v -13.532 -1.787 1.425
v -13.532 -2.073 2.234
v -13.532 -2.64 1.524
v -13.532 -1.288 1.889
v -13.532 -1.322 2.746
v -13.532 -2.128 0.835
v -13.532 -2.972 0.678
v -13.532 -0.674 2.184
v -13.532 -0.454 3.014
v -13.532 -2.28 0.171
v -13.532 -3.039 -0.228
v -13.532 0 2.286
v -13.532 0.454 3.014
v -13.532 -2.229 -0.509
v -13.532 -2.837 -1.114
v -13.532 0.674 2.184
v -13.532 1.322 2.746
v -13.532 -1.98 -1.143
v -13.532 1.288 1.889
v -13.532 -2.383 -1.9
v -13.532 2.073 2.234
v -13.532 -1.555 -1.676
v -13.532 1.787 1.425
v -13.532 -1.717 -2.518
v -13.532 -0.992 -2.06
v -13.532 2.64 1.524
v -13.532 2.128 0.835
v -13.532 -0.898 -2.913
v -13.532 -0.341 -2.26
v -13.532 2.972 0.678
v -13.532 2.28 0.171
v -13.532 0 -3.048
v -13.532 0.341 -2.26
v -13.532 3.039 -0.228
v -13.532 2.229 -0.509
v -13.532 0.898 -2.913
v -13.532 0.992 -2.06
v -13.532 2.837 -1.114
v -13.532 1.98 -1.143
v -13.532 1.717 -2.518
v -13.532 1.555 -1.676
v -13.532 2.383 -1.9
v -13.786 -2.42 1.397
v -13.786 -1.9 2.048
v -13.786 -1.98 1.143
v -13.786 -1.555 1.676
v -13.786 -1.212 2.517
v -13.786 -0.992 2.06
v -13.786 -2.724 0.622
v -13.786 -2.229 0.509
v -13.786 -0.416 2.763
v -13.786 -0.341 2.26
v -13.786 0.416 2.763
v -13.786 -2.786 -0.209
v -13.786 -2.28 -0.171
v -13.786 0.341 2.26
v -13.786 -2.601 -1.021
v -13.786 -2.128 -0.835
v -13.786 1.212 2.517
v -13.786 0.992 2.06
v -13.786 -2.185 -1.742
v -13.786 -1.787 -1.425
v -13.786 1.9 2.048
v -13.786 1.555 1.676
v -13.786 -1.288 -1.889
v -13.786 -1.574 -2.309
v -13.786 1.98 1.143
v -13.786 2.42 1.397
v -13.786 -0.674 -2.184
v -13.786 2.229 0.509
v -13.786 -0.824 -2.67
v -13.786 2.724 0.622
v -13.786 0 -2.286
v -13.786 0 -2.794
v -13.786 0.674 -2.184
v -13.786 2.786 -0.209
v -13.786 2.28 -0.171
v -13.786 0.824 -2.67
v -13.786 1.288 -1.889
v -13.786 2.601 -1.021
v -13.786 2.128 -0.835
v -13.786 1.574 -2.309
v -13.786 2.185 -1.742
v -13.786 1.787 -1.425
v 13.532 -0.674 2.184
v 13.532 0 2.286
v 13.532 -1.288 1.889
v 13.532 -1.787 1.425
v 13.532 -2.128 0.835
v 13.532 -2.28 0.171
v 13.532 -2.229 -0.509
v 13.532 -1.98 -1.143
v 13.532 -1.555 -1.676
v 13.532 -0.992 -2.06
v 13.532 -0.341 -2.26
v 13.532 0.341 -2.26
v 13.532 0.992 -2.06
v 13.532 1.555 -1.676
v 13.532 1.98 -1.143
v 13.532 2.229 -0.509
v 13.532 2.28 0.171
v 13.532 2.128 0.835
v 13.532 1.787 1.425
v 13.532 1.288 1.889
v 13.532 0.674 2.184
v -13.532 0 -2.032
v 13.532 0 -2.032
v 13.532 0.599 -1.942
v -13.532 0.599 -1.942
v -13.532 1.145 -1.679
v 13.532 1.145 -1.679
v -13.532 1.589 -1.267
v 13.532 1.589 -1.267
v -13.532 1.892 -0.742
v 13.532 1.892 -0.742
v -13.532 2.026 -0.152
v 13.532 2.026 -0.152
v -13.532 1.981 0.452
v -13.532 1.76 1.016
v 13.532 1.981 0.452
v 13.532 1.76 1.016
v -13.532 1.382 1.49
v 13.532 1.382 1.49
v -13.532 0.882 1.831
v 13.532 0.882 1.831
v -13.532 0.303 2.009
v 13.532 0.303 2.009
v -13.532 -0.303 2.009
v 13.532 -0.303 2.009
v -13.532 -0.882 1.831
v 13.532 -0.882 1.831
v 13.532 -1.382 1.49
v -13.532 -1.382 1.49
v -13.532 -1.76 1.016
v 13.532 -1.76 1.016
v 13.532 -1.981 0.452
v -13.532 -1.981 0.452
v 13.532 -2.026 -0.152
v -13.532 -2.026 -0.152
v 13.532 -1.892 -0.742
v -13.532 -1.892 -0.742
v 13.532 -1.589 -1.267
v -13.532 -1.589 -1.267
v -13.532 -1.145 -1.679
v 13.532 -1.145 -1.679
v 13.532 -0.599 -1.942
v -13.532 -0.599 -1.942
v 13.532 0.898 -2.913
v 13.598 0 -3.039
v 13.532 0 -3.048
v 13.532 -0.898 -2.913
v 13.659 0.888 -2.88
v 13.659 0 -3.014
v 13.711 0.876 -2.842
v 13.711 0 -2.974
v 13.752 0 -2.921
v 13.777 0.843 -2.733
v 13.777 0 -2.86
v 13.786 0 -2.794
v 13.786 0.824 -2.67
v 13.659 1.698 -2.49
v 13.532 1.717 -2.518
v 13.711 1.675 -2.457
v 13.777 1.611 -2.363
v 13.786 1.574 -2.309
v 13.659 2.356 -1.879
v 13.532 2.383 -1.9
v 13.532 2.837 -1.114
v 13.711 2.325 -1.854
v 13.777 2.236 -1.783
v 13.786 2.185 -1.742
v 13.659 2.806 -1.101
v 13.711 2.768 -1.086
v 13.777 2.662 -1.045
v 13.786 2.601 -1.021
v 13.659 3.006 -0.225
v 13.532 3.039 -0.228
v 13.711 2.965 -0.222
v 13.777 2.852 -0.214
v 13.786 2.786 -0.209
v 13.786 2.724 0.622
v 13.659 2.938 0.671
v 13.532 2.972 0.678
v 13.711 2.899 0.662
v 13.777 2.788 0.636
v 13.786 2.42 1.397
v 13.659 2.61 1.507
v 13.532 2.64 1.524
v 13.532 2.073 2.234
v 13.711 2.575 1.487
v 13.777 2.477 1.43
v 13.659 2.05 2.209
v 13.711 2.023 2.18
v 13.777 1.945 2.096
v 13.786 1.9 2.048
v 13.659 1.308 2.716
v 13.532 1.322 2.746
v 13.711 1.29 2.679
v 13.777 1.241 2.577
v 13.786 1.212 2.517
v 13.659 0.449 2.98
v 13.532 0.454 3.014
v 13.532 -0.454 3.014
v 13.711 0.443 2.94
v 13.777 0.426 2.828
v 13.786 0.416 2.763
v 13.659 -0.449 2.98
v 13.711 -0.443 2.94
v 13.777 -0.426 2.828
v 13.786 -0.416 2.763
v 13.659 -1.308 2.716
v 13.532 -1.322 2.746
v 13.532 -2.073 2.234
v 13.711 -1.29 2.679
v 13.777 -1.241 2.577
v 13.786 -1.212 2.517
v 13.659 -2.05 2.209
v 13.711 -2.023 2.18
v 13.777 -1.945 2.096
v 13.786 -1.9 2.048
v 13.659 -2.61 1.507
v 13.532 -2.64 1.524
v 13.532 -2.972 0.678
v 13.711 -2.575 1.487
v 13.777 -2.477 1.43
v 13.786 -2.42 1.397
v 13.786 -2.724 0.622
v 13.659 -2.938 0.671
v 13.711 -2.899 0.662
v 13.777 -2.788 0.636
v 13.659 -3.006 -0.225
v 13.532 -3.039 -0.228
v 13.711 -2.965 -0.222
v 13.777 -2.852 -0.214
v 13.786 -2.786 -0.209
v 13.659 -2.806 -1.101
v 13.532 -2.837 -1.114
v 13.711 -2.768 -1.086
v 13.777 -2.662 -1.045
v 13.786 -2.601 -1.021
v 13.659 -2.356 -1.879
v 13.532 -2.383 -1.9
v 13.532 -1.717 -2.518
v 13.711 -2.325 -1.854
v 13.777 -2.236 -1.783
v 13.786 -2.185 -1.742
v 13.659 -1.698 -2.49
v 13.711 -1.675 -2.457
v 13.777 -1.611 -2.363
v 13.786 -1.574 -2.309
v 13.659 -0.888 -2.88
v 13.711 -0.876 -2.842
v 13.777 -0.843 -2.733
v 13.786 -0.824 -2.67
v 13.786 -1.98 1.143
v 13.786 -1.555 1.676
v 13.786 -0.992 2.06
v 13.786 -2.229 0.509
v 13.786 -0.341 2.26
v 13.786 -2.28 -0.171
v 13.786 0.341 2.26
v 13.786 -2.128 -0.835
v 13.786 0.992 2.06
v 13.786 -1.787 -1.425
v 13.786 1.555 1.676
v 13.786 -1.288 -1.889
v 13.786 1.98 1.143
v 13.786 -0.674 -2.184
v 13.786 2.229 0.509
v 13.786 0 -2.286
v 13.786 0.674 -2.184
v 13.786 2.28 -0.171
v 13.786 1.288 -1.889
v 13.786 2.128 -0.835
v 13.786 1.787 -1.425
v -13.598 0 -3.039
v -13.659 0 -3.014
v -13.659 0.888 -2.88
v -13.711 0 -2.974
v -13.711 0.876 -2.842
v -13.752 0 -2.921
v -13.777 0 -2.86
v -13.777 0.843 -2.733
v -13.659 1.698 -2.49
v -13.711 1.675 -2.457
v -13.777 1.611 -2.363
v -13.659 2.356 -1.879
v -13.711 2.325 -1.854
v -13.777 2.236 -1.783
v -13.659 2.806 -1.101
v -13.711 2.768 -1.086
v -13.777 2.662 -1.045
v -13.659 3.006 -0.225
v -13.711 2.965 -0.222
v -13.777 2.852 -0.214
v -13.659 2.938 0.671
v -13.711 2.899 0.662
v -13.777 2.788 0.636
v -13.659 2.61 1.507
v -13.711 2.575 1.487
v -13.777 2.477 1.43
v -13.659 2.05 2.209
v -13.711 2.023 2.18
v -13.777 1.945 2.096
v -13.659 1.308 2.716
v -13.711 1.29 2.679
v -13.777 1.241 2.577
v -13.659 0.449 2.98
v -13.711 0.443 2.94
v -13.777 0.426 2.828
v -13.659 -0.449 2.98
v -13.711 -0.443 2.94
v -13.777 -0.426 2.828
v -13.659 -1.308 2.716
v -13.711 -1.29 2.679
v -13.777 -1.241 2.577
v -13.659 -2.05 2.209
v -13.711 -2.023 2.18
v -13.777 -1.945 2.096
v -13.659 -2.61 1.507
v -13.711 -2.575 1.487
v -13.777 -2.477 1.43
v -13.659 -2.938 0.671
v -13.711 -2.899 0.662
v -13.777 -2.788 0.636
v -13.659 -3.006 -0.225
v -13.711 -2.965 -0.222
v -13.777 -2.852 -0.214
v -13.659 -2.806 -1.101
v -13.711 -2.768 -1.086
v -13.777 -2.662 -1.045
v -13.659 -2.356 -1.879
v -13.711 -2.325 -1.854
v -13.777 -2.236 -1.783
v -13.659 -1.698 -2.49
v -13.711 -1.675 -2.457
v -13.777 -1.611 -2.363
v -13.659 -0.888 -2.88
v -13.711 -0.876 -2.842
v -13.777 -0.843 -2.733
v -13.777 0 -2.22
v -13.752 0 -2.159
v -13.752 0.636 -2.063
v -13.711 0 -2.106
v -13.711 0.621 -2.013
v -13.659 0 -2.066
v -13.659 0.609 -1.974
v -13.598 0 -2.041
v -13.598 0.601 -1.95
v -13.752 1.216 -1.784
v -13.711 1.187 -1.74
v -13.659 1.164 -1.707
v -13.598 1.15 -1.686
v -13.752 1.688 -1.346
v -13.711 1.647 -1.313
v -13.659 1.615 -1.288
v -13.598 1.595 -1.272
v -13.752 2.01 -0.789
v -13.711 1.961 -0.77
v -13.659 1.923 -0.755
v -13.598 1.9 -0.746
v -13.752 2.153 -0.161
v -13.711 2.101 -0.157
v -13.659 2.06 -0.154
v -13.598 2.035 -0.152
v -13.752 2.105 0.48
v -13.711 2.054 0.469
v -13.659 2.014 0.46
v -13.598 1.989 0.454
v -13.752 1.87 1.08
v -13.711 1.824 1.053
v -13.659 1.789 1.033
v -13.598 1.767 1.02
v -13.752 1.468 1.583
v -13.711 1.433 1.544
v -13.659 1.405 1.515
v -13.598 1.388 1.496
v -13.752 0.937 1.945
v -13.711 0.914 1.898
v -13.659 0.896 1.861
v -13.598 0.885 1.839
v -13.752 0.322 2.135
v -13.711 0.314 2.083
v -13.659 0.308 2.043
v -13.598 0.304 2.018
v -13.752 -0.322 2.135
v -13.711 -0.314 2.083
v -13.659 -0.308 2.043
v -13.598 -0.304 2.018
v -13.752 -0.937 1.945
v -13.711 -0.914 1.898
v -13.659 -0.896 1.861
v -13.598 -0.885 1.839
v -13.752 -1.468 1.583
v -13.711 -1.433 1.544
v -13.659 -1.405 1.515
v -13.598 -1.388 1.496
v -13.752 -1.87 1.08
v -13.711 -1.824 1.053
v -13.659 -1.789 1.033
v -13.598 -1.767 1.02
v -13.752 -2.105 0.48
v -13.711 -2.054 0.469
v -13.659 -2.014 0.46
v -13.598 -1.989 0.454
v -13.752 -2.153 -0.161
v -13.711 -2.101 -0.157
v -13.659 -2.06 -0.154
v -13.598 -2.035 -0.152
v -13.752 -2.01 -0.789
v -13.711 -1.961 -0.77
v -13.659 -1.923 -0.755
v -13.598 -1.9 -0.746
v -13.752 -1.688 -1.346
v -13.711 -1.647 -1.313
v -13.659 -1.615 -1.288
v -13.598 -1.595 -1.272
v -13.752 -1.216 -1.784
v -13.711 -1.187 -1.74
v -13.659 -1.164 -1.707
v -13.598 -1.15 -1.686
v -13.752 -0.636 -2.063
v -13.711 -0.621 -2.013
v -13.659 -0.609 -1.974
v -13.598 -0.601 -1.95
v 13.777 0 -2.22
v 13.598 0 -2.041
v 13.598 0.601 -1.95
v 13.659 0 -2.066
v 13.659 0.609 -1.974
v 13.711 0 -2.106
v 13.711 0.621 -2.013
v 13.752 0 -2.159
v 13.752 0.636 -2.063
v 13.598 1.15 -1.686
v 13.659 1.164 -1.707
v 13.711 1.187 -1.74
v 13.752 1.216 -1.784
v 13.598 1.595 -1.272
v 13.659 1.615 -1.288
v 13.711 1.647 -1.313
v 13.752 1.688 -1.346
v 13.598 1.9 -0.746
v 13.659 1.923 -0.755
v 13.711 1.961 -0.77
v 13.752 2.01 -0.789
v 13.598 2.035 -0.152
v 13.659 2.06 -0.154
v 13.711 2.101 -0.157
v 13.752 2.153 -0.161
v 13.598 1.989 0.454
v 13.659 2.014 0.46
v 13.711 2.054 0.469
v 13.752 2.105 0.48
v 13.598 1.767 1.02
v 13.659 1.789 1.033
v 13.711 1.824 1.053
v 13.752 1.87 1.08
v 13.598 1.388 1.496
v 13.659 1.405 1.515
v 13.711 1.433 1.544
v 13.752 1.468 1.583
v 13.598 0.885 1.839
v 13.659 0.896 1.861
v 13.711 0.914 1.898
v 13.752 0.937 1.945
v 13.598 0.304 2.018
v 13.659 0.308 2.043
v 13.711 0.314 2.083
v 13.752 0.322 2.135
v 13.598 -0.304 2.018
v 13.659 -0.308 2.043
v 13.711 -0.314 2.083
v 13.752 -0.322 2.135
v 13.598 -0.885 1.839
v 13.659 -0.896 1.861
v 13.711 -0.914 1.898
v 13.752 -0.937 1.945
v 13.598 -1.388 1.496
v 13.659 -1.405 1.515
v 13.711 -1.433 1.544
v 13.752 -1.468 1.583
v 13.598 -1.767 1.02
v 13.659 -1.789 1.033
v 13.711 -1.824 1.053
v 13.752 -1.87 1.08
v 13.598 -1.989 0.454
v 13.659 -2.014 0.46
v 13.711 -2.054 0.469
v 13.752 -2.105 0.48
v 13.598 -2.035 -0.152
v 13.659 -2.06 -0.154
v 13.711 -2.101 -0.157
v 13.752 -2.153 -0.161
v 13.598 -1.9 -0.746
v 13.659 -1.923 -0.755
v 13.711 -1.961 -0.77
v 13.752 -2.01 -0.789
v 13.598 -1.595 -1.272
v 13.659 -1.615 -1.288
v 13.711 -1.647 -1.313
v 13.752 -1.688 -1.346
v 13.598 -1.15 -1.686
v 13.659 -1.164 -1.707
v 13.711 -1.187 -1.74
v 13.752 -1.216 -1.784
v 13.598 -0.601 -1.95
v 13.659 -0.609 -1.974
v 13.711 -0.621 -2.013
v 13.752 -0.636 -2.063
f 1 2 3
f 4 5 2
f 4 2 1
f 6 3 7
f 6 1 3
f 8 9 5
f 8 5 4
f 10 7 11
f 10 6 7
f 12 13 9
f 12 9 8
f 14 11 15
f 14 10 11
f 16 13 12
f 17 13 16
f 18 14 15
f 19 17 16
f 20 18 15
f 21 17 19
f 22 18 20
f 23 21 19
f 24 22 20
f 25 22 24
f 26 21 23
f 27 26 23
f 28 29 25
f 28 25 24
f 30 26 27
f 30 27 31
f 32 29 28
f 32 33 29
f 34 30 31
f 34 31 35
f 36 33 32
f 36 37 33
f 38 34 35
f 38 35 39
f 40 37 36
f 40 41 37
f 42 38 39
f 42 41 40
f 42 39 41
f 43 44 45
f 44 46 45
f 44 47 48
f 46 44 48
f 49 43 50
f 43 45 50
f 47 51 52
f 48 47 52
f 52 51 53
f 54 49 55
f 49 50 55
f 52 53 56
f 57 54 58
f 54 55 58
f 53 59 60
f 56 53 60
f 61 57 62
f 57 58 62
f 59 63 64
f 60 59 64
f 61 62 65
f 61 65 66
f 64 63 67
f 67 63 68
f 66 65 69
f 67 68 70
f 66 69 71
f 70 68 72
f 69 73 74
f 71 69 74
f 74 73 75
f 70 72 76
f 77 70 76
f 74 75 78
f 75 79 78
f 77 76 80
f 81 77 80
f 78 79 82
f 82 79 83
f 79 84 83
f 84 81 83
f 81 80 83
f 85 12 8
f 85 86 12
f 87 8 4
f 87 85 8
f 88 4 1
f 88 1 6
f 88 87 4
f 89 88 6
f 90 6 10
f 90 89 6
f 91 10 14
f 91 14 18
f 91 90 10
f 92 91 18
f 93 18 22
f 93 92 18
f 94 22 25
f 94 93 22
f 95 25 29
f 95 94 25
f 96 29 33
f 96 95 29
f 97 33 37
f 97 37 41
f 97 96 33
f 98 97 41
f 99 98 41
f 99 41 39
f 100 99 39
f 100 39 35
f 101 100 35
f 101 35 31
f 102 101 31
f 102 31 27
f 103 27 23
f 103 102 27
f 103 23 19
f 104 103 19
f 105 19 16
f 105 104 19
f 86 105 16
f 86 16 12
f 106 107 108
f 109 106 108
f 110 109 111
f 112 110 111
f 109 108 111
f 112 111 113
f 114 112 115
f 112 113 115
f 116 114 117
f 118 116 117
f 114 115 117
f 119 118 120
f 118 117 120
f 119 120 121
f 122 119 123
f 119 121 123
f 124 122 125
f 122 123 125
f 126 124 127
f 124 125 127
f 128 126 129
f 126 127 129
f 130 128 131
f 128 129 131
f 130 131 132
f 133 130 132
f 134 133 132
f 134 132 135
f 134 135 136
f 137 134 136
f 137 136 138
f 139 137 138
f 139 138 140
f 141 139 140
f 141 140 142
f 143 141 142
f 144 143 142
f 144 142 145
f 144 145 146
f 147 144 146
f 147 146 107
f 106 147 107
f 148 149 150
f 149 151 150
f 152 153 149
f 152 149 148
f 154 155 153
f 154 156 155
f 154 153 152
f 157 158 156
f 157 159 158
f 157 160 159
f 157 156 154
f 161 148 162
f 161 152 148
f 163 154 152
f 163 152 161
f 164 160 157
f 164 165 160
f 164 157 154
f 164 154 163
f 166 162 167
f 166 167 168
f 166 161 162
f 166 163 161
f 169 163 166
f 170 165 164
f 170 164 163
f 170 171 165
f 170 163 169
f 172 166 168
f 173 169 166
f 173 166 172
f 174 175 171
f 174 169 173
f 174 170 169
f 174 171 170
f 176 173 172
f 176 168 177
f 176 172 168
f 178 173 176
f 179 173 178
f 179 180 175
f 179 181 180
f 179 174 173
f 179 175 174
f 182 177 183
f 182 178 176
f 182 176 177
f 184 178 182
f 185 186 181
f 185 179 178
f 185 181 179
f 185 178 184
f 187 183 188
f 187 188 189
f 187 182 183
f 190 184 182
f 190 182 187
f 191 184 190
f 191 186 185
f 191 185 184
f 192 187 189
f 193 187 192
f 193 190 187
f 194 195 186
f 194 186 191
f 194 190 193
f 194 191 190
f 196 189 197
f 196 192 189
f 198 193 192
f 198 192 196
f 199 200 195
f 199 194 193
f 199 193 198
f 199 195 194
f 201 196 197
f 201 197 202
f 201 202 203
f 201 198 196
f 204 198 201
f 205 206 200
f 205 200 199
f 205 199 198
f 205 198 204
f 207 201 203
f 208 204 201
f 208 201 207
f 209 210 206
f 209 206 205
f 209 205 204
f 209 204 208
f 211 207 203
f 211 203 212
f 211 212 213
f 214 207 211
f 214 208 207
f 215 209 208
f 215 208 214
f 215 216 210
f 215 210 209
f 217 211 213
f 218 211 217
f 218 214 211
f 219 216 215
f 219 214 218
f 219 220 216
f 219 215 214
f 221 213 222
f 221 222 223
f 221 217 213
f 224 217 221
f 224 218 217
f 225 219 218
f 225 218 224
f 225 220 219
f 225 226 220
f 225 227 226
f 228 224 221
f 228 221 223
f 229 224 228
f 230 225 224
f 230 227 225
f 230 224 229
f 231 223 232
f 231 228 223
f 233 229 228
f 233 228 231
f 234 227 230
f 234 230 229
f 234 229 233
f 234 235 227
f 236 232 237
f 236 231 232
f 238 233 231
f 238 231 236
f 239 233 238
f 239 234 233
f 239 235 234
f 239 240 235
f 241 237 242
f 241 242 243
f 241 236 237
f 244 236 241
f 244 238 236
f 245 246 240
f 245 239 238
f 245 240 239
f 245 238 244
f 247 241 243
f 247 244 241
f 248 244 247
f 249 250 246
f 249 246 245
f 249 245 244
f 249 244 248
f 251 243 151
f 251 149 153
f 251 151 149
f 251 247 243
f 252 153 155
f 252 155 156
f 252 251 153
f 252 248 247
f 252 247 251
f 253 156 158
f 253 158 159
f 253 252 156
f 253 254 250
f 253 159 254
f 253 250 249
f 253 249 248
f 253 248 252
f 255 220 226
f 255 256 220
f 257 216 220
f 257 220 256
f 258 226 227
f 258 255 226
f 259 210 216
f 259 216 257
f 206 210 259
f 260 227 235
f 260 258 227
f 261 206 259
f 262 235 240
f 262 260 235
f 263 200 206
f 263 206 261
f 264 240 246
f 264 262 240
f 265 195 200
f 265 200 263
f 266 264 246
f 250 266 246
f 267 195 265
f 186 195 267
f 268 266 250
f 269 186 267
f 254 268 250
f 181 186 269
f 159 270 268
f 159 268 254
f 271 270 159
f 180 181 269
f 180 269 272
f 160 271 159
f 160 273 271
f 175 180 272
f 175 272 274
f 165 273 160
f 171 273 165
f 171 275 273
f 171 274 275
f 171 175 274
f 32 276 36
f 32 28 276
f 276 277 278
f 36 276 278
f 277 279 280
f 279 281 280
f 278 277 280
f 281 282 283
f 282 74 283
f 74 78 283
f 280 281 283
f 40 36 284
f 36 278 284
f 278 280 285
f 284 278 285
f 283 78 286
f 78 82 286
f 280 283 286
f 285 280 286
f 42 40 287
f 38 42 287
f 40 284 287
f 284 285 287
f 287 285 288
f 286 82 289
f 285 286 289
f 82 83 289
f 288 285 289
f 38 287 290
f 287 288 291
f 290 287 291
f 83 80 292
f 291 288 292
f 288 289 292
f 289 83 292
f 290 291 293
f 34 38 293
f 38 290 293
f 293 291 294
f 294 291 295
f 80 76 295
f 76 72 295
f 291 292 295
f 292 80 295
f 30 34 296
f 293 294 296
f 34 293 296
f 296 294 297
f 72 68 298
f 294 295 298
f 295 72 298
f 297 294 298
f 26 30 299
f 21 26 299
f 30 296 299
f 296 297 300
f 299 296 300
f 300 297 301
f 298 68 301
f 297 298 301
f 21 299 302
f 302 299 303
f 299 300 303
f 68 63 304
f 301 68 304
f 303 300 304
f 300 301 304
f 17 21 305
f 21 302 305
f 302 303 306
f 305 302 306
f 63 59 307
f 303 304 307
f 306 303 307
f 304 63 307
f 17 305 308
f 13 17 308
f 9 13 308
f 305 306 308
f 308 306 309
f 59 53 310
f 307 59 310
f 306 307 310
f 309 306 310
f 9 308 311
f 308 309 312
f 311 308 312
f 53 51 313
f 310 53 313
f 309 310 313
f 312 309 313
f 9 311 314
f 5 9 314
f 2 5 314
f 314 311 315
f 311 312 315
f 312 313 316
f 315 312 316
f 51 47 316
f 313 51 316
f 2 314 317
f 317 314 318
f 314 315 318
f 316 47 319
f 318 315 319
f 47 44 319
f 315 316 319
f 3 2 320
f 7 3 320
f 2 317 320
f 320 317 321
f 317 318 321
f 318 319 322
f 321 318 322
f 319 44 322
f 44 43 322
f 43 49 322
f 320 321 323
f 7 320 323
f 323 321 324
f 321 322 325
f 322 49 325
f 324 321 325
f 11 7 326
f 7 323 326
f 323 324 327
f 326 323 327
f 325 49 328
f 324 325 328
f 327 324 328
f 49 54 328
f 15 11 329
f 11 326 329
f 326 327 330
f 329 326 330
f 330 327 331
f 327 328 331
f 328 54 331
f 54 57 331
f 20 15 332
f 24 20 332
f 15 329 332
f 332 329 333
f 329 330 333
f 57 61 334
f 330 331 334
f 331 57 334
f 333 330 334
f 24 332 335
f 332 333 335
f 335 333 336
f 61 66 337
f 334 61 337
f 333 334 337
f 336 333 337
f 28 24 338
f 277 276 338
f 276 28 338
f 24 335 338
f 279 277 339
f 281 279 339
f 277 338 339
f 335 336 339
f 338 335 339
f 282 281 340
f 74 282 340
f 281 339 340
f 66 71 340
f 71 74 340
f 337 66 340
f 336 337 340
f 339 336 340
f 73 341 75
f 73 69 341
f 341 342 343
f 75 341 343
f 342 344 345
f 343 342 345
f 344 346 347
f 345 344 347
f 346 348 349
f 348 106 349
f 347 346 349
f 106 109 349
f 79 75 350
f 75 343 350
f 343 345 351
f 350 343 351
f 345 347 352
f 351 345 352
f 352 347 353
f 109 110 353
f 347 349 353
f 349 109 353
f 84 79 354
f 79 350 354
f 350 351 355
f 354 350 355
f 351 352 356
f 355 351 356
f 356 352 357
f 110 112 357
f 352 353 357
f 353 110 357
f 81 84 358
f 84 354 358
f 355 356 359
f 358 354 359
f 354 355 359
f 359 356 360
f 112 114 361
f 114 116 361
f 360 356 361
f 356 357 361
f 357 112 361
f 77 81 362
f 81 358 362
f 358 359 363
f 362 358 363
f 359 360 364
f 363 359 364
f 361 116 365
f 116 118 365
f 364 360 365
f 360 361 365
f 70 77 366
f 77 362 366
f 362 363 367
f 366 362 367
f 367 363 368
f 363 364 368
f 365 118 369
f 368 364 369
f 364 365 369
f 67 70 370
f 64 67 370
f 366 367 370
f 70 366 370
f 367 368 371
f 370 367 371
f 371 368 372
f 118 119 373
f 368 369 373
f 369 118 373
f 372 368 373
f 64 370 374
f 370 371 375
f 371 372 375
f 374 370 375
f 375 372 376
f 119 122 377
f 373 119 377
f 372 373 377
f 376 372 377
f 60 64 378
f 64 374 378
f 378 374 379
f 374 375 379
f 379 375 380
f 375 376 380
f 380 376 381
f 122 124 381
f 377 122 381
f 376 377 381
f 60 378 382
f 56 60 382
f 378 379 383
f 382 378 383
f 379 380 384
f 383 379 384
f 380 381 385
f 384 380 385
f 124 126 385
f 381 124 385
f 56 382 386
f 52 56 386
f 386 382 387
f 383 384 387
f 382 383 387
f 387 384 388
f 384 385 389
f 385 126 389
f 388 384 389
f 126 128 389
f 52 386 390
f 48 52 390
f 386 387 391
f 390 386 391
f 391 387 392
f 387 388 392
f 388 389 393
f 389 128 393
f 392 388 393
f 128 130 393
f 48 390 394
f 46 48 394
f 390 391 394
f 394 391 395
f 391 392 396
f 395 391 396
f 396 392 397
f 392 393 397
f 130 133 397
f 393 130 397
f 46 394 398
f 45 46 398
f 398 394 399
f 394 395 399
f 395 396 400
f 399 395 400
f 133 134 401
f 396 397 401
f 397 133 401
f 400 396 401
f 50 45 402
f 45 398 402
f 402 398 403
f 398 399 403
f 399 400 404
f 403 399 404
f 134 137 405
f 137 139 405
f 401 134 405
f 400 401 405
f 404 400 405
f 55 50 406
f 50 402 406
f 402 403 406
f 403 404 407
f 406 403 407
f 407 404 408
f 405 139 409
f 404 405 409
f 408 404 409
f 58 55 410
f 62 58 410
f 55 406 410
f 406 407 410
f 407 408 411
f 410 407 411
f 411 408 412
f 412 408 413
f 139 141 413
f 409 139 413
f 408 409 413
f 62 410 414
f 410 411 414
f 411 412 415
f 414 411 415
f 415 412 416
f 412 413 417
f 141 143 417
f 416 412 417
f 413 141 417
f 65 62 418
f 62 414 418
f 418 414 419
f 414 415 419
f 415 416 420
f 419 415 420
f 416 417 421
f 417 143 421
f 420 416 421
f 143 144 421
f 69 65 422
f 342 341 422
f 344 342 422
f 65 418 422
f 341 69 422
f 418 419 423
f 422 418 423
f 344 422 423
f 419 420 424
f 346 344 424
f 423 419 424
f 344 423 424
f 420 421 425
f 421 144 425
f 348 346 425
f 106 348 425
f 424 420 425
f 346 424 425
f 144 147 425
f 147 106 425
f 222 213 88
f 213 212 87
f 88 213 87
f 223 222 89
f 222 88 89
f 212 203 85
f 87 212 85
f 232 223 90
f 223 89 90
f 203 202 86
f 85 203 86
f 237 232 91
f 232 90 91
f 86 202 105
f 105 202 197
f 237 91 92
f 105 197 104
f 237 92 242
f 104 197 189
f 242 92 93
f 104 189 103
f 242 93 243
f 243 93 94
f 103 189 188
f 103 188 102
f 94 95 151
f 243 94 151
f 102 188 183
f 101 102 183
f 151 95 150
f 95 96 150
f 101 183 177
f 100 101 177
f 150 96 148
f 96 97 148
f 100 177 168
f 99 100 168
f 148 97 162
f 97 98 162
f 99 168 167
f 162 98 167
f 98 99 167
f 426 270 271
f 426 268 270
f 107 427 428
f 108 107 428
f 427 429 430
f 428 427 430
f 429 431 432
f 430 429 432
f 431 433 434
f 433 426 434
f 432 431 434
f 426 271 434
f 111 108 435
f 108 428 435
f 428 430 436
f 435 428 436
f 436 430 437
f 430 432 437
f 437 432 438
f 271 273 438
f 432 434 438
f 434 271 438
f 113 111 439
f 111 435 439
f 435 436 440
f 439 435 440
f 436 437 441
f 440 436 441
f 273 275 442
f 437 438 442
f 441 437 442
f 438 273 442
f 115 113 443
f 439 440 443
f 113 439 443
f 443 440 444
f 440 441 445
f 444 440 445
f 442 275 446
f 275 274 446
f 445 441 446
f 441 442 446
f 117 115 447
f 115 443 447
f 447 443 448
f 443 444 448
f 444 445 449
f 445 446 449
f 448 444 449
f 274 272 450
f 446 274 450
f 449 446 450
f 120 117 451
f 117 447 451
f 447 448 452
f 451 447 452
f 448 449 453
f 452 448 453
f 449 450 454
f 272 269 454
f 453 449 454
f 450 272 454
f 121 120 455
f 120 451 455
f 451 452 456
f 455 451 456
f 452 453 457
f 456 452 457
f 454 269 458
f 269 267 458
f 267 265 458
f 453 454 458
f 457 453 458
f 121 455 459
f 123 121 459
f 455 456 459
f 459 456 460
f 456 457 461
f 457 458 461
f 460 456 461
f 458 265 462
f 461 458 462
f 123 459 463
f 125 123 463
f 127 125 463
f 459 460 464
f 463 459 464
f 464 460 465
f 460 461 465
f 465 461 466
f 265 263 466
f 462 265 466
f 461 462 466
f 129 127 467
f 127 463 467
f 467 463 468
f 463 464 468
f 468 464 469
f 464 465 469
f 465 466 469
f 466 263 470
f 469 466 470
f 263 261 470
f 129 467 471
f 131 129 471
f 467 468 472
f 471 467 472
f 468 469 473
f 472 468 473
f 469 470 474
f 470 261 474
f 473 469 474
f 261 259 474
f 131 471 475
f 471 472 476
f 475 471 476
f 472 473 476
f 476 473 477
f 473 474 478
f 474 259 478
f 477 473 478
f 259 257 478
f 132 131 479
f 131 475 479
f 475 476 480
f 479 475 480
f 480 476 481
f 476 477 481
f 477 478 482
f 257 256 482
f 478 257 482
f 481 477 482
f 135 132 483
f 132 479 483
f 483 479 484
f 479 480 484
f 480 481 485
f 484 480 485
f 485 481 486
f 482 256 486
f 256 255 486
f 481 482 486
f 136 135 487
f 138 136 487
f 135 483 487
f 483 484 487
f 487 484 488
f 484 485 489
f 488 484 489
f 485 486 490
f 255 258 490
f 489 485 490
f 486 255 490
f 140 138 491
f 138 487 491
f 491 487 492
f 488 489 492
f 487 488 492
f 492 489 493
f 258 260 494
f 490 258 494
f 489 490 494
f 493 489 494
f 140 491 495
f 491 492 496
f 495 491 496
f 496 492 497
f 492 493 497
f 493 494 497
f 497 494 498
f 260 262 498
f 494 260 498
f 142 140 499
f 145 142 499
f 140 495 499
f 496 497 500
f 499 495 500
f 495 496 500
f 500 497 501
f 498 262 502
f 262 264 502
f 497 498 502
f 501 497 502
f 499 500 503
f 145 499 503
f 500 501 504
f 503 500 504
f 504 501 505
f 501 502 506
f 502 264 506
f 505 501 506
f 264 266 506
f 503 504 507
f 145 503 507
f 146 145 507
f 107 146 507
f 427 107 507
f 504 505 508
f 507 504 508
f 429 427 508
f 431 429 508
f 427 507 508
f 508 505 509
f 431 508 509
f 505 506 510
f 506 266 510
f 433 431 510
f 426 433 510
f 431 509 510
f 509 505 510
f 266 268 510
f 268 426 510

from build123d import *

# Parameters (mm, degrees)
SKETCH1_R            = 2.286
EXTRUDE1_DEPTH       = 13.53185
SKETCH2_R            = 3.048
EXTRUDE2_DEPTH       = 0.254
FILLET1_R            = 0.254
FILLET1_OF_MIRROR1_R = 0.254
SKETCH3_R            = 2.032
CUT_EXTRUDE1_DEPTH   = 28.9066167
FILLET2_R            = 0.254


with BuildPart() as part:
    # Sketch1 → Extrude1 (new, symmetric)
    with BuildSketch(Plane(origin=(0, 0, 0), x_dir=(0, 0, -1), z_dir=(1, 0, 0))):
        with Locations(Location((0, 0, 0), (0, 0, 180))):
            Circle(SKETCH1_R)
    extrude(amount=EXTRUDE1_DEPTH, both=True)

    # Sketch2 → Extrude2 (add)
    with BuildSketch(Plane(origin=(13.53185, 0, 0), x_dir=(0, 0, -1), z_dir=(1, 0, 0))):
        Circle(SKETCH2_R)
    extrude2 = extrude(amount=EXTRUDE2_DEPTH)

    # Fillet1
    fillet1_edges = [part.edges().sort_by_distance(p)[0] for p in [
        (13.78585, 0, 3.048),
    ]]
    fillet(fillet1_edges, radius=FILLET1_R - 0.0001)  # a hair under: the kernel refuses the full size

    # Mirror1: Extrude2 across plane
    add(extrude2.mirror(Plane(origin=(0, 0, 0), x_dir=(0, 0, 1), z_dir=(1, 0, 0))))

    # Fillet1 of Mirror1
    fillet1_of_mirror1_edges = [part.edges().sort_by_distance(p)[0] for p in [
        (-13.78585, 0, 3.048),
    ]]
    fillet(fillet1_of_mirror1_edges, radius=FILLET1_OF_MIRROR1_R - 0.0001)  # a hair under: the kernel refuses the full size

    # Sketch3 → Cut-Extrude1 (cut, through all)
    with BuildSketch(Plane(origin=(13.78585, 0, 0), x_dir=(0, 0, -1), z_dir=(1, 0, 0))):
        Circle(SKETCH3_R)
    extrude(amount=-CUT_EXTRUDE1_DEPTH, mode=Mode.SUBTRACT)

    # Fillet2
    fillet2_edges = [part.edges().sort_by_distance(p)[0] for p in [
        (-13.78585, 0, 2.032),
        (13.78585, 0, 2.032),
    ]]
    fillet(fillet2_edges, radius=FILLET2_R)


solid = part.part
